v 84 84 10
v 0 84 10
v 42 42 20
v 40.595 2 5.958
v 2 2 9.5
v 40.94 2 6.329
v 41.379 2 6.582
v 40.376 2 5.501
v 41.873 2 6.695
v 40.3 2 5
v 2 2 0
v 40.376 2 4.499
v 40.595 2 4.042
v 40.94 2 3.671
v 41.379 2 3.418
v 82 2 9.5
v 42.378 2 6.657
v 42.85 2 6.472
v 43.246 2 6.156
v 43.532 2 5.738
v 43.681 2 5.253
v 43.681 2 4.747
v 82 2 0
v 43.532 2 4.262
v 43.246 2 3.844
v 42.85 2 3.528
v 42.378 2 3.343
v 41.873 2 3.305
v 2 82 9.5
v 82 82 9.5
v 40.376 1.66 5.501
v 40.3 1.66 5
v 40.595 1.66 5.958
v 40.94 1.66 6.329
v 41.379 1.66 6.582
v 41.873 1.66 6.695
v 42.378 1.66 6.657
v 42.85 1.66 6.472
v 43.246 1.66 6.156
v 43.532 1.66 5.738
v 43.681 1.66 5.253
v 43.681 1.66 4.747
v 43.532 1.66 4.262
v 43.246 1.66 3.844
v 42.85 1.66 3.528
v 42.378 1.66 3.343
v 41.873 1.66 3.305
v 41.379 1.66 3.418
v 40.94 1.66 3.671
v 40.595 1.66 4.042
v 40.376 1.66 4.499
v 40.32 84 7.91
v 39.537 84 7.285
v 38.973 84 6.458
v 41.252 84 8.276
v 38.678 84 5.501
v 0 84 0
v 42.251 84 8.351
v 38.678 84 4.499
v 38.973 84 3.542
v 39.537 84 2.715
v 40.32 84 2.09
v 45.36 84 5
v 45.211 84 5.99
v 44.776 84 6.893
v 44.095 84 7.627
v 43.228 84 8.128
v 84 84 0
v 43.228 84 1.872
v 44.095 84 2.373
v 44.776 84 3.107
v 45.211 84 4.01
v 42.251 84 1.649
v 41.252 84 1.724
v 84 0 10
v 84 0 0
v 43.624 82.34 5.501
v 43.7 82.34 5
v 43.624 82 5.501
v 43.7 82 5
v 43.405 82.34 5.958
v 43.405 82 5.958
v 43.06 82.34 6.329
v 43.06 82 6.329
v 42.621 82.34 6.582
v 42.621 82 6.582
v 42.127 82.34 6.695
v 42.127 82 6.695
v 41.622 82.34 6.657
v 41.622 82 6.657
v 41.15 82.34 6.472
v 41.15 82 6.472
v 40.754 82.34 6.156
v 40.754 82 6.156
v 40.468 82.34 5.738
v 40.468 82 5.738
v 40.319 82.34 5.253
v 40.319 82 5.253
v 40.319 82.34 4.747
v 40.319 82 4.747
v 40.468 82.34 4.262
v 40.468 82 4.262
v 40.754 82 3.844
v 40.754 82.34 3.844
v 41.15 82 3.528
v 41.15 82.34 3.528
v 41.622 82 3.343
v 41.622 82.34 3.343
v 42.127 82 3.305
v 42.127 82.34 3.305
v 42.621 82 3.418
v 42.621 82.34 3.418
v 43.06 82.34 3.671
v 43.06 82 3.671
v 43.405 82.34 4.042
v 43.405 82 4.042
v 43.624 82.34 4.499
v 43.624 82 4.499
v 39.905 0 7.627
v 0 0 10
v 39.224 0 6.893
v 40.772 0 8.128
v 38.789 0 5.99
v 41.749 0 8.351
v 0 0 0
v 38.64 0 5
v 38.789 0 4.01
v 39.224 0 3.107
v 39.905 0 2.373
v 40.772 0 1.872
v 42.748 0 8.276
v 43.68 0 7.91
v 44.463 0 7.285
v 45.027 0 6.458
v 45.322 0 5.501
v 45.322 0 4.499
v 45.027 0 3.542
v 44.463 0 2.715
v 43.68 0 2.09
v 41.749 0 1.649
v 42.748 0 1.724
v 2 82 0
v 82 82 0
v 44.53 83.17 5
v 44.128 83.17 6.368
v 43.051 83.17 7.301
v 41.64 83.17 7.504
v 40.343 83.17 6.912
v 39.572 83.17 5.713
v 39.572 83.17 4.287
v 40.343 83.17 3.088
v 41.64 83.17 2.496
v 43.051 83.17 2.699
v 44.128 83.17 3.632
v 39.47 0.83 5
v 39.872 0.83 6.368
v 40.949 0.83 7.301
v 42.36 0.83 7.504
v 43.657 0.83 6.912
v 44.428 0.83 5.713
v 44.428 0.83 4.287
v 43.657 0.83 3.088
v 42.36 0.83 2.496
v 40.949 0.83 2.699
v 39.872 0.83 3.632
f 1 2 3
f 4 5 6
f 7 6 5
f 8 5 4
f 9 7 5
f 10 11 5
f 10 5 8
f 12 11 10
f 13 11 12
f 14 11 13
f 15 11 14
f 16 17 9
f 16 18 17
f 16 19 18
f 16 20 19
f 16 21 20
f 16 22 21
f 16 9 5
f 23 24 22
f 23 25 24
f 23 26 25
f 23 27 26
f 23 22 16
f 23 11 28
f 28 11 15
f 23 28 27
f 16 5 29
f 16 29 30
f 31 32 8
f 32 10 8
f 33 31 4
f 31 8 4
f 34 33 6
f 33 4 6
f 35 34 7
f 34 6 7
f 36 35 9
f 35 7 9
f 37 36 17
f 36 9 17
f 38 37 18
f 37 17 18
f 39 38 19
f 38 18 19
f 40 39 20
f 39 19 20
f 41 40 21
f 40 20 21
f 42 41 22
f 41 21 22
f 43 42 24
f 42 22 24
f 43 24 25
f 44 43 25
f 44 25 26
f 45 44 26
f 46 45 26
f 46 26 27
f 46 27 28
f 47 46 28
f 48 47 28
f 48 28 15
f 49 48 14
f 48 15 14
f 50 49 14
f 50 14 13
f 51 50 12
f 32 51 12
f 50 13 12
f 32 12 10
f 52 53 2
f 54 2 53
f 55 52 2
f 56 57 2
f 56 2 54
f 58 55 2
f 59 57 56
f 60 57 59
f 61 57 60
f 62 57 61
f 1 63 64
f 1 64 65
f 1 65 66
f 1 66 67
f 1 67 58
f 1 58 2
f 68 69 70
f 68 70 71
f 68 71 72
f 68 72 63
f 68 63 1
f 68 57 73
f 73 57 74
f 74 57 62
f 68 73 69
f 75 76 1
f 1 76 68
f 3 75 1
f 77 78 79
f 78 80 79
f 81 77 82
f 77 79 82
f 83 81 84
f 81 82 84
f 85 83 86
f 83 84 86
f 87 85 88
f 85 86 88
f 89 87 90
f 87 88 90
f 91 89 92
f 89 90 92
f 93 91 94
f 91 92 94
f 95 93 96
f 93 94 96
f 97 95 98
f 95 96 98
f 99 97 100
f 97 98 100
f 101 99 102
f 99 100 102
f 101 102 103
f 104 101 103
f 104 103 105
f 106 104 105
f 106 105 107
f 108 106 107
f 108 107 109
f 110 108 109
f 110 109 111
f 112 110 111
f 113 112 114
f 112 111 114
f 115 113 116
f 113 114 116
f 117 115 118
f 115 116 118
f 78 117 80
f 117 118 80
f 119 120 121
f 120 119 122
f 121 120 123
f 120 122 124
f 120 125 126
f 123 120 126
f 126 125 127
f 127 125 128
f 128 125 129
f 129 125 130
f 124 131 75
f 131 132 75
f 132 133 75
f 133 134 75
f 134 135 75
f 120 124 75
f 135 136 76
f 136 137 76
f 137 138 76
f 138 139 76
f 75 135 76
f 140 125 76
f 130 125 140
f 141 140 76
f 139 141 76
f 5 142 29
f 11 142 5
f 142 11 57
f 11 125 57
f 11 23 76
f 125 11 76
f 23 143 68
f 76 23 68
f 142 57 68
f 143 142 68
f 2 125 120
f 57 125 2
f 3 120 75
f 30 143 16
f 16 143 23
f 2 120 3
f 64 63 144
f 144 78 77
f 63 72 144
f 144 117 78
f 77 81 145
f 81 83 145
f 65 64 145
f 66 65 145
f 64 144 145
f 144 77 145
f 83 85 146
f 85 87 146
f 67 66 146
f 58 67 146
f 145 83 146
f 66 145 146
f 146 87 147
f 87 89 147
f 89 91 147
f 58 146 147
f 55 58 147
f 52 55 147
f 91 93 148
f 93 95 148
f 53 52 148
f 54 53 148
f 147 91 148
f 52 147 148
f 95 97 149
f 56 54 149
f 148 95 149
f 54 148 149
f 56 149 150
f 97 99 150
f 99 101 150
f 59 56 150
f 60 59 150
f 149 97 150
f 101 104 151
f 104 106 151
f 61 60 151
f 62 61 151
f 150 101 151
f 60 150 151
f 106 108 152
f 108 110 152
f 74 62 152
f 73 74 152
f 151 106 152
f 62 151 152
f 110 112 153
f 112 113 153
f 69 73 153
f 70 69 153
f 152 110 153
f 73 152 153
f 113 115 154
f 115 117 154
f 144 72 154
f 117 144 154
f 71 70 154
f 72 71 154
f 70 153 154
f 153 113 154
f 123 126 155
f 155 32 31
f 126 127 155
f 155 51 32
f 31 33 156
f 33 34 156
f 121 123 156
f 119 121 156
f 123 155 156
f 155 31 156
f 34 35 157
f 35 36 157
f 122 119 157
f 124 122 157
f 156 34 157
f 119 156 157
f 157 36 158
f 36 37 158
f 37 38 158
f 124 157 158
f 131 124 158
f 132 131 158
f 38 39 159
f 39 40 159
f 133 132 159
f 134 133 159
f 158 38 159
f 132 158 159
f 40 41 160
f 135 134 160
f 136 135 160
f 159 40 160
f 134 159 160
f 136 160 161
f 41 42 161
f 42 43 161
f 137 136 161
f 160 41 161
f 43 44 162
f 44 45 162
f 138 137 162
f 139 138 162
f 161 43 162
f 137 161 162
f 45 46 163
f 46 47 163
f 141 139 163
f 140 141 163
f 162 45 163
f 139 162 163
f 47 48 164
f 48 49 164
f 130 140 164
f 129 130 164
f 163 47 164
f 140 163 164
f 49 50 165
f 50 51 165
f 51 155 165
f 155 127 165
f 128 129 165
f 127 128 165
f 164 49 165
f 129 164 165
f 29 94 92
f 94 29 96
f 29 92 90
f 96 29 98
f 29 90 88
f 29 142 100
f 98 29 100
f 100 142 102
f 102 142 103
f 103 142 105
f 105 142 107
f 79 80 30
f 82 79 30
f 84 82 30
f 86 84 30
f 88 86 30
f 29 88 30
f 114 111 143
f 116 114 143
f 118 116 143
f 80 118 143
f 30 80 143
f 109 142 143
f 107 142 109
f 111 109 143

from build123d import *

# Parameters (mm, degrees)
F0_W            = 84
F0_H            = 84
F1_DEPTH        = 10
F2_W            = 80
F2_H            = 80
F3_DEPTH        = 9.5
F4_W            = 84
F4_H            = 84
F5_DEPTH        = 10
F6_SIZE2        = 9.99999
F6_SIZE         = 41.99999
F8_D            = 3.4
F8_DEPTH        = 12
F8_CSINK_D      = 6.72
F8_CSINK_ANGLE  = 90
F8_TIP          = 1.0214630523
F10_D           = 3.4
F10_DEPTH       = 12
F10_CSINK_D     = 6.72
F10_CSINK_ANGLE = 90
F10_TIP         = 1.0214630523


# Not quite as in the source:
# - a fillet or chamfer is up to 0.001 mm smaller than in the source, because OpenCascade refuses the exact size


with BuildPart() as f1:
    # F0 (on Top) → F1 (new body)
    with BuildSketch(Plane.XY):
        with Locations((42, 42)):
            Rectangle(F0_W, F0_H)
    extrude(amount=F1_DEPTH)

    # F2 (on face) → F3 (cut)
    with BuildSketch(Plane(origin=(0, 0, 0), x_dir=(1, 0, 0), z_dir=(0, 0, -1))):
        with Locations((42, -42)):
            Rectangle(F2_W, F2_H)
    extrude(amount=-F3_DEPTH, mode=Mode.SUBTRACT)

    # F4 (on face) → F5 (join)
    with BuildSketch(Plane.XY.offset(10)):
        with Locations((42, 42)):
            Rectangle(F4_W, F4_H)
    extrude(amount=F5_DEPTH)

    # F6 (size 42 and 10 in the source; OpenCascade refuses exactly that, so slightly less here)
    f6_edges = [f1.edges().sort_by_distance(p)[0] for p in [
        (0, 42, 20),
        (42, 84, 20),
        (84, 42, 20),
        (42, 0, 20),
    ]]
    f6_side = f1.faces().sort_by_distance((42, 42, 20))[0]
    chamfer(f6_edges, length=F6_SIZE, length2=F6_SIZE2, reference=f6_side)

    # F8
    with Locations(Plane.XZ):
        with Locations((42, 5)):
            CounterSinkHole(F8_D / 2, F8_CSINK_D / 2, depth=F8_DEPTH, counter_sink_angle=F8_CSINK_ANGLE)
            with Locations((0, 0, -(F8_DEPTH + F8_TIP / 2))):  # 118° drill point
                Cone(0, F8_D / 2, F8_TIP, mode=Mode.SUBTRACT)

    # F10
    with Locations(Plane(origin=(0, 84, 0), x_dir=(-1, 0, 0), z_dir=(0, 1, 0))):
        with Locations((-42, 5)):
            CounterSinkHole(F10_D / 2, F10_CSINK_D / 2, depth=F10_DEPTH, counter_sink_angle=F10_CSINK_ANGLE)
            with Locations((0, 0, -(F10_DEPTH + F10_TIP / 2))):  # 118° drill point
                Cone(0, F10_D / 2, F10_TIP, mode=Mode.SUBTRACT)


solid = f1.part
